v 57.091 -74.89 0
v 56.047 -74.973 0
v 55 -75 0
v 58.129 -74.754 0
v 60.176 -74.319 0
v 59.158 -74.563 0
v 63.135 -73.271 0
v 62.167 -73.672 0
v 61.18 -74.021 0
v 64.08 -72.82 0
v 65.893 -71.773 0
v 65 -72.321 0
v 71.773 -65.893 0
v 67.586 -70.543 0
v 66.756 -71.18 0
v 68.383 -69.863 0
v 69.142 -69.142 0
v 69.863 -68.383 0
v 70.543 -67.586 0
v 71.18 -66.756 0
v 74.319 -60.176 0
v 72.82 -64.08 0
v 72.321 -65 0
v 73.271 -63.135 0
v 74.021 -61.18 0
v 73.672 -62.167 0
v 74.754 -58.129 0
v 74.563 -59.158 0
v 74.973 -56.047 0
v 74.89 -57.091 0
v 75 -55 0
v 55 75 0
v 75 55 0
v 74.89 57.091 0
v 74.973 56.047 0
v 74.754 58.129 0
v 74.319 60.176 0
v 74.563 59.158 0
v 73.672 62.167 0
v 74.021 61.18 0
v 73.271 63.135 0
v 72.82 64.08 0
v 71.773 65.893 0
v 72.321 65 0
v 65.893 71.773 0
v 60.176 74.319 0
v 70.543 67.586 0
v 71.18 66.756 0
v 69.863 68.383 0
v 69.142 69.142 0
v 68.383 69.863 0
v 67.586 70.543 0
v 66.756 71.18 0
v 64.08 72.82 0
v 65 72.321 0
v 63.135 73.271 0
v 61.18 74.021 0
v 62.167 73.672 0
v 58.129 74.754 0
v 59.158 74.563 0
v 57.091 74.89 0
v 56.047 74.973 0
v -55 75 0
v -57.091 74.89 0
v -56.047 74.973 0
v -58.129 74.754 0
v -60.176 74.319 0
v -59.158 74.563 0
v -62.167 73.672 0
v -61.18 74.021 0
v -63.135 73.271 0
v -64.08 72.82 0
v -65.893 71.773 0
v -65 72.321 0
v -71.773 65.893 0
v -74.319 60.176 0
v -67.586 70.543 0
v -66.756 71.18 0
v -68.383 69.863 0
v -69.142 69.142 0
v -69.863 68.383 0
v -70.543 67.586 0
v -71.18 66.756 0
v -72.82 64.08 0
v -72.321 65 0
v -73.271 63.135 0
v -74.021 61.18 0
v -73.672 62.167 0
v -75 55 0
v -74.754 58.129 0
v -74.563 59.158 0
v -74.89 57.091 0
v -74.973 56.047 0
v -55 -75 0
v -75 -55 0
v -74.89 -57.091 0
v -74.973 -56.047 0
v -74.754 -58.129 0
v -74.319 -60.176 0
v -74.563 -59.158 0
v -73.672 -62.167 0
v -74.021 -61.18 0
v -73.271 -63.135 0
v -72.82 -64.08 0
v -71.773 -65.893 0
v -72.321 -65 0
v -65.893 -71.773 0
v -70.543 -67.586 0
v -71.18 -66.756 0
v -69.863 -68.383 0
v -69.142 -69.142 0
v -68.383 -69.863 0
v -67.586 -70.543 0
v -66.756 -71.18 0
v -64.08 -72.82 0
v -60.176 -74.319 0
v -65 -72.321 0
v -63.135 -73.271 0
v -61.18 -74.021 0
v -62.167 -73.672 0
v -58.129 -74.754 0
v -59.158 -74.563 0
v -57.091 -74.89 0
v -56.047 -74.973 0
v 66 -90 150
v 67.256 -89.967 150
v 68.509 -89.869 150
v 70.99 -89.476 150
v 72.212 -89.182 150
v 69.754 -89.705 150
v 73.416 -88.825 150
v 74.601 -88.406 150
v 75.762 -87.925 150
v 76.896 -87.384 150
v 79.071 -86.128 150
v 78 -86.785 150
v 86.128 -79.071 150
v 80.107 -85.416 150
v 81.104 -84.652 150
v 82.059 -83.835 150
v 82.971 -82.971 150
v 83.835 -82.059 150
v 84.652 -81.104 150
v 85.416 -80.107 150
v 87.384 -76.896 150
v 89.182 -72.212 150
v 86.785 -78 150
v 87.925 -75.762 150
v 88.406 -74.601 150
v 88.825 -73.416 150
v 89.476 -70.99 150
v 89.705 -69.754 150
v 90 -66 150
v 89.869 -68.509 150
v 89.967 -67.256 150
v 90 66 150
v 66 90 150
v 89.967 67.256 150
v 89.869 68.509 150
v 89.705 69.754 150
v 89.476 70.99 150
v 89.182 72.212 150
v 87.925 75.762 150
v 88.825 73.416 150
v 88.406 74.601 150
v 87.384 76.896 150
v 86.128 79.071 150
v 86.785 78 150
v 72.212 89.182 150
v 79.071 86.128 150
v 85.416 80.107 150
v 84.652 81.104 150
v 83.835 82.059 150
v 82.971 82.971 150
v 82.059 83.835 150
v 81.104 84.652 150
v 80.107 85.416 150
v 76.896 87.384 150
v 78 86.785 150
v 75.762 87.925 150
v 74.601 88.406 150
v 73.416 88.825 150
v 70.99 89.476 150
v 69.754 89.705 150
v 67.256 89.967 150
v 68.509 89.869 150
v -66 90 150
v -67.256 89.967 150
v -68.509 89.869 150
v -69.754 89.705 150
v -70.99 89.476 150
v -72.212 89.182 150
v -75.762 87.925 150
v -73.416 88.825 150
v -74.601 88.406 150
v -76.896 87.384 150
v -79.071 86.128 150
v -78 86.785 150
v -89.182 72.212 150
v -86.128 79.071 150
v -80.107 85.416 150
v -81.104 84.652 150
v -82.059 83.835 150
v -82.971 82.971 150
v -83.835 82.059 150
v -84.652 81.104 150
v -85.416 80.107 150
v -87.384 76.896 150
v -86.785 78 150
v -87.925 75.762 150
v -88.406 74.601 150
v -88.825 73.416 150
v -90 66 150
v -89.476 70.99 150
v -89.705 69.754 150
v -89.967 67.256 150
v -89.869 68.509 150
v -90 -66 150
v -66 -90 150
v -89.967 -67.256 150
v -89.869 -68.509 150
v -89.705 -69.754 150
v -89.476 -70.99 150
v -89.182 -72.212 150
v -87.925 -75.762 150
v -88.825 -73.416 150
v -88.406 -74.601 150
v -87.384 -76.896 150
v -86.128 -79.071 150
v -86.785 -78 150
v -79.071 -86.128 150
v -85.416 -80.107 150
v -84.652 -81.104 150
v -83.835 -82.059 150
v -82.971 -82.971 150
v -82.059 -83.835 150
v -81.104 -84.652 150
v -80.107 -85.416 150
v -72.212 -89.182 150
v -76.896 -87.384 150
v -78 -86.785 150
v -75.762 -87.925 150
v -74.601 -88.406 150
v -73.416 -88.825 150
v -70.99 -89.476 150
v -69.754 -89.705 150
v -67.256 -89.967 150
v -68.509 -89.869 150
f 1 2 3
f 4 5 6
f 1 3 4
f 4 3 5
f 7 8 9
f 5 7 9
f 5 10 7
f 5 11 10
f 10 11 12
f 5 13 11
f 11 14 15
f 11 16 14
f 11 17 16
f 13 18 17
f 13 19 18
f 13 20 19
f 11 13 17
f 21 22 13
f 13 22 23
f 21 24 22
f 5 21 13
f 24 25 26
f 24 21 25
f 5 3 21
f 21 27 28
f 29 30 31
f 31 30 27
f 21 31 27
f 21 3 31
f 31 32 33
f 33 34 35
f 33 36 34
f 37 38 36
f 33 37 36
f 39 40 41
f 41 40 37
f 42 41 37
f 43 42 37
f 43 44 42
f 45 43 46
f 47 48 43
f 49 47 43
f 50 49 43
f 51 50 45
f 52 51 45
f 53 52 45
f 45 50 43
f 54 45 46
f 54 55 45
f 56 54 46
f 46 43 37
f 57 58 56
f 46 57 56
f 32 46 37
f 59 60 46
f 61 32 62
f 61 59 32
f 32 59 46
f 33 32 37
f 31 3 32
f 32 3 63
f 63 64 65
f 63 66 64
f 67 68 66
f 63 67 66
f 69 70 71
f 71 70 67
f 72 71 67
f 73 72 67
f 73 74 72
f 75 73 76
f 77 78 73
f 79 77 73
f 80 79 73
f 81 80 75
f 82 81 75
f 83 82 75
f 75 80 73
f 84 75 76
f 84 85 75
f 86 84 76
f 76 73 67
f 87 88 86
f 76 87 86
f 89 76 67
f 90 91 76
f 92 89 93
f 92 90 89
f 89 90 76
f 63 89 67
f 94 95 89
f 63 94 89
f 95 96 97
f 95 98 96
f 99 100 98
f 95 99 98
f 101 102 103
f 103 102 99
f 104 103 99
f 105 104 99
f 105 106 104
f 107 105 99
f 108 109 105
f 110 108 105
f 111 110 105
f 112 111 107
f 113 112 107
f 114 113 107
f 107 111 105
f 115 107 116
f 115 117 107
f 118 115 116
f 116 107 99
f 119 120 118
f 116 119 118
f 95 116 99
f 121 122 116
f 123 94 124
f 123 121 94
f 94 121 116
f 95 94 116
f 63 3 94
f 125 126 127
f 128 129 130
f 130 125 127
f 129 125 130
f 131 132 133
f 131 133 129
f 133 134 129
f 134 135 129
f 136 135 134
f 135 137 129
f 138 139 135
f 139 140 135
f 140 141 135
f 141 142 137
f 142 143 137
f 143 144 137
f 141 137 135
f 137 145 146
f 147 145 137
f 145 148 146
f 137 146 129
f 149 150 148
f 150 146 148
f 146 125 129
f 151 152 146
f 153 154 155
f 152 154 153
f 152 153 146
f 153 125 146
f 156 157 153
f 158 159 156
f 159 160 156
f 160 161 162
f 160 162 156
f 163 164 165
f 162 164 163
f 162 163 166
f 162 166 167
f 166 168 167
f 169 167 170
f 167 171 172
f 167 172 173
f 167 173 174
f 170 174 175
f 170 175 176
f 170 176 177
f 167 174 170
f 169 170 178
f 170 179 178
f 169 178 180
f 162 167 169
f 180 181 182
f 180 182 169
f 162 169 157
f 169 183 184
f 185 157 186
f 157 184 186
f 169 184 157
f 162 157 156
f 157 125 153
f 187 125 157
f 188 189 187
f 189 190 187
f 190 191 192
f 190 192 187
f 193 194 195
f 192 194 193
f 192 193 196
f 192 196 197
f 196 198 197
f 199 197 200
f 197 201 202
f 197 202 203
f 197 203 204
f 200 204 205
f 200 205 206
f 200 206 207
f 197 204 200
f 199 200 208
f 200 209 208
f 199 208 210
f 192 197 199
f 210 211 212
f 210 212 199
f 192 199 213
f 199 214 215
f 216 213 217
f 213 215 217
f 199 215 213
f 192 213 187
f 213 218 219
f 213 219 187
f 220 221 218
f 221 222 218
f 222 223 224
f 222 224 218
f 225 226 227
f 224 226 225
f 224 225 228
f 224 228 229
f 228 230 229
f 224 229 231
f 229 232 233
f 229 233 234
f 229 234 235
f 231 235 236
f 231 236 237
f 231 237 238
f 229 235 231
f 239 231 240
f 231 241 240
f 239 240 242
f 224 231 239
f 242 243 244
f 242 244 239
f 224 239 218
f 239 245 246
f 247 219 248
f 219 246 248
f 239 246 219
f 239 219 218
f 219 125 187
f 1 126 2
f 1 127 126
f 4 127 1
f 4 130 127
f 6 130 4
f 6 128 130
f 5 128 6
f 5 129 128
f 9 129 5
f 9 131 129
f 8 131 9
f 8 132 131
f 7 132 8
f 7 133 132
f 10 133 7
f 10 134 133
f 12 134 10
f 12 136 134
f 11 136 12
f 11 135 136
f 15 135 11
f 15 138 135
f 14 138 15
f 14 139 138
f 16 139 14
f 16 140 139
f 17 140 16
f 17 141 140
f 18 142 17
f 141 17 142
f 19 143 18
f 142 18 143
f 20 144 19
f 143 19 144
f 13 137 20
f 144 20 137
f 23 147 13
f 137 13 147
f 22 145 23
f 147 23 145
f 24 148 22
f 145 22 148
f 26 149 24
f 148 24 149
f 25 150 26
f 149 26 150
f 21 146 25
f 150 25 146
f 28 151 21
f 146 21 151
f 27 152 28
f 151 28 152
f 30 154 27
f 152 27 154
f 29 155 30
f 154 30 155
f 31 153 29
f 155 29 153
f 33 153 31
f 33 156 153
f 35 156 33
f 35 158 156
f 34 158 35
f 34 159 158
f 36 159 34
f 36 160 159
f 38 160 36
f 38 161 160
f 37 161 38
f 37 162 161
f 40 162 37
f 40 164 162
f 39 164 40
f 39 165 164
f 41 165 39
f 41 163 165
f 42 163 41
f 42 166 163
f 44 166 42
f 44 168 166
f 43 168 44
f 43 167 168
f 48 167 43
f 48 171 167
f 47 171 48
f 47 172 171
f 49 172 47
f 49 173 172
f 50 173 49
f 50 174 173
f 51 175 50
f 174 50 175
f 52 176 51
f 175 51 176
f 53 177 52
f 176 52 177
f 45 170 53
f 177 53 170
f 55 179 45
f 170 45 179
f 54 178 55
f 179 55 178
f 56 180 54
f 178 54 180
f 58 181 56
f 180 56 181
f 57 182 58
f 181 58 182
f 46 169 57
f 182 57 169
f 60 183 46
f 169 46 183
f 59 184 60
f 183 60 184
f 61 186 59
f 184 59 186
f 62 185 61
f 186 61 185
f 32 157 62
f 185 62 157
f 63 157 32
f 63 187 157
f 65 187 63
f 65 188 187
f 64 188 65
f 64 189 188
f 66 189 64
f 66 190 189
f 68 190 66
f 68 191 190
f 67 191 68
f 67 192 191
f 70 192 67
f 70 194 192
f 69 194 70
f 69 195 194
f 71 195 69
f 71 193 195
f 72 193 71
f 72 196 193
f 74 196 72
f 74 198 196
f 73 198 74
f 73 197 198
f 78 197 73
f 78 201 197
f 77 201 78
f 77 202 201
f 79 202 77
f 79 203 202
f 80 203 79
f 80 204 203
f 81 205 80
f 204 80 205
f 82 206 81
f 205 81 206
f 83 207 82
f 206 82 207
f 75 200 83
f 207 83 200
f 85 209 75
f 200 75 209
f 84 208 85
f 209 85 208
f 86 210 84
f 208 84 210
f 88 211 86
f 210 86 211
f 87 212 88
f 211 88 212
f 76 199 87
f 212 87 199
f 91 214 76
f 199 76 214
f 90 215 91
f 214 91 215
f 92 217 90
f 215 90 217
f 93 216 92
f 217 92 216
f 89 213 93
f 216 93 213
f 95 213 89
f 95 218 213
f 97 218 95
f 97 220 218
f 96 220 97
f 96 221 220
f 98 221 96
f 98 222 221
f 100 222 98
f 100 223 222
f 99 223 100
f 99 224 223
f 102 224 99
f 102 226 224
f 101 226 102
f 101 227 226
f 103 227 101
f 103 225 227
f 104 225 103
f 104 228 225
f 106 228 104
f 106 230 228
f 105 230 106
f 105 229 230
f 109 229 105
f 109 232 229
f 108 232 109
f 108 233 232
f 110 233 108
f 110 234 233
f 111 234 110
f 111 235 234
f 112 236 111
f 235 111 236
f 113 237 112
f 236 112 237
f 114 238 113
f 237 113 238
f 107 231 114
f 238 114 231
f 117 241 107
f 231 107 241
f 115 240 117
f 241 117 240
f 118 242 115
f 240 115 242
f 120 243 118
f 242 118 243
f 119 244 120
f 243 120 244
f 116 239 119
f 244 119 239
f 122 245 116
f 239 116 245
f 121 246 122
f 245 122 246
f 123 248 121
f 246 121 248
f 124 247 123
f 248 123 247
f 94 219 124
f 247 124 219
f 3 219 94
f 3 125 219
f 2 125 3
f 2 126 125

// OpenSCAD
side = 150;
height = 150;
expand = 1.2;

rounding = 20;

$fn = 120;

module base() {
    linear_extrude(height, scale = expand)
    offset(rounding)
    offset(-rounding)
        square(side, center = true);
}

base();
